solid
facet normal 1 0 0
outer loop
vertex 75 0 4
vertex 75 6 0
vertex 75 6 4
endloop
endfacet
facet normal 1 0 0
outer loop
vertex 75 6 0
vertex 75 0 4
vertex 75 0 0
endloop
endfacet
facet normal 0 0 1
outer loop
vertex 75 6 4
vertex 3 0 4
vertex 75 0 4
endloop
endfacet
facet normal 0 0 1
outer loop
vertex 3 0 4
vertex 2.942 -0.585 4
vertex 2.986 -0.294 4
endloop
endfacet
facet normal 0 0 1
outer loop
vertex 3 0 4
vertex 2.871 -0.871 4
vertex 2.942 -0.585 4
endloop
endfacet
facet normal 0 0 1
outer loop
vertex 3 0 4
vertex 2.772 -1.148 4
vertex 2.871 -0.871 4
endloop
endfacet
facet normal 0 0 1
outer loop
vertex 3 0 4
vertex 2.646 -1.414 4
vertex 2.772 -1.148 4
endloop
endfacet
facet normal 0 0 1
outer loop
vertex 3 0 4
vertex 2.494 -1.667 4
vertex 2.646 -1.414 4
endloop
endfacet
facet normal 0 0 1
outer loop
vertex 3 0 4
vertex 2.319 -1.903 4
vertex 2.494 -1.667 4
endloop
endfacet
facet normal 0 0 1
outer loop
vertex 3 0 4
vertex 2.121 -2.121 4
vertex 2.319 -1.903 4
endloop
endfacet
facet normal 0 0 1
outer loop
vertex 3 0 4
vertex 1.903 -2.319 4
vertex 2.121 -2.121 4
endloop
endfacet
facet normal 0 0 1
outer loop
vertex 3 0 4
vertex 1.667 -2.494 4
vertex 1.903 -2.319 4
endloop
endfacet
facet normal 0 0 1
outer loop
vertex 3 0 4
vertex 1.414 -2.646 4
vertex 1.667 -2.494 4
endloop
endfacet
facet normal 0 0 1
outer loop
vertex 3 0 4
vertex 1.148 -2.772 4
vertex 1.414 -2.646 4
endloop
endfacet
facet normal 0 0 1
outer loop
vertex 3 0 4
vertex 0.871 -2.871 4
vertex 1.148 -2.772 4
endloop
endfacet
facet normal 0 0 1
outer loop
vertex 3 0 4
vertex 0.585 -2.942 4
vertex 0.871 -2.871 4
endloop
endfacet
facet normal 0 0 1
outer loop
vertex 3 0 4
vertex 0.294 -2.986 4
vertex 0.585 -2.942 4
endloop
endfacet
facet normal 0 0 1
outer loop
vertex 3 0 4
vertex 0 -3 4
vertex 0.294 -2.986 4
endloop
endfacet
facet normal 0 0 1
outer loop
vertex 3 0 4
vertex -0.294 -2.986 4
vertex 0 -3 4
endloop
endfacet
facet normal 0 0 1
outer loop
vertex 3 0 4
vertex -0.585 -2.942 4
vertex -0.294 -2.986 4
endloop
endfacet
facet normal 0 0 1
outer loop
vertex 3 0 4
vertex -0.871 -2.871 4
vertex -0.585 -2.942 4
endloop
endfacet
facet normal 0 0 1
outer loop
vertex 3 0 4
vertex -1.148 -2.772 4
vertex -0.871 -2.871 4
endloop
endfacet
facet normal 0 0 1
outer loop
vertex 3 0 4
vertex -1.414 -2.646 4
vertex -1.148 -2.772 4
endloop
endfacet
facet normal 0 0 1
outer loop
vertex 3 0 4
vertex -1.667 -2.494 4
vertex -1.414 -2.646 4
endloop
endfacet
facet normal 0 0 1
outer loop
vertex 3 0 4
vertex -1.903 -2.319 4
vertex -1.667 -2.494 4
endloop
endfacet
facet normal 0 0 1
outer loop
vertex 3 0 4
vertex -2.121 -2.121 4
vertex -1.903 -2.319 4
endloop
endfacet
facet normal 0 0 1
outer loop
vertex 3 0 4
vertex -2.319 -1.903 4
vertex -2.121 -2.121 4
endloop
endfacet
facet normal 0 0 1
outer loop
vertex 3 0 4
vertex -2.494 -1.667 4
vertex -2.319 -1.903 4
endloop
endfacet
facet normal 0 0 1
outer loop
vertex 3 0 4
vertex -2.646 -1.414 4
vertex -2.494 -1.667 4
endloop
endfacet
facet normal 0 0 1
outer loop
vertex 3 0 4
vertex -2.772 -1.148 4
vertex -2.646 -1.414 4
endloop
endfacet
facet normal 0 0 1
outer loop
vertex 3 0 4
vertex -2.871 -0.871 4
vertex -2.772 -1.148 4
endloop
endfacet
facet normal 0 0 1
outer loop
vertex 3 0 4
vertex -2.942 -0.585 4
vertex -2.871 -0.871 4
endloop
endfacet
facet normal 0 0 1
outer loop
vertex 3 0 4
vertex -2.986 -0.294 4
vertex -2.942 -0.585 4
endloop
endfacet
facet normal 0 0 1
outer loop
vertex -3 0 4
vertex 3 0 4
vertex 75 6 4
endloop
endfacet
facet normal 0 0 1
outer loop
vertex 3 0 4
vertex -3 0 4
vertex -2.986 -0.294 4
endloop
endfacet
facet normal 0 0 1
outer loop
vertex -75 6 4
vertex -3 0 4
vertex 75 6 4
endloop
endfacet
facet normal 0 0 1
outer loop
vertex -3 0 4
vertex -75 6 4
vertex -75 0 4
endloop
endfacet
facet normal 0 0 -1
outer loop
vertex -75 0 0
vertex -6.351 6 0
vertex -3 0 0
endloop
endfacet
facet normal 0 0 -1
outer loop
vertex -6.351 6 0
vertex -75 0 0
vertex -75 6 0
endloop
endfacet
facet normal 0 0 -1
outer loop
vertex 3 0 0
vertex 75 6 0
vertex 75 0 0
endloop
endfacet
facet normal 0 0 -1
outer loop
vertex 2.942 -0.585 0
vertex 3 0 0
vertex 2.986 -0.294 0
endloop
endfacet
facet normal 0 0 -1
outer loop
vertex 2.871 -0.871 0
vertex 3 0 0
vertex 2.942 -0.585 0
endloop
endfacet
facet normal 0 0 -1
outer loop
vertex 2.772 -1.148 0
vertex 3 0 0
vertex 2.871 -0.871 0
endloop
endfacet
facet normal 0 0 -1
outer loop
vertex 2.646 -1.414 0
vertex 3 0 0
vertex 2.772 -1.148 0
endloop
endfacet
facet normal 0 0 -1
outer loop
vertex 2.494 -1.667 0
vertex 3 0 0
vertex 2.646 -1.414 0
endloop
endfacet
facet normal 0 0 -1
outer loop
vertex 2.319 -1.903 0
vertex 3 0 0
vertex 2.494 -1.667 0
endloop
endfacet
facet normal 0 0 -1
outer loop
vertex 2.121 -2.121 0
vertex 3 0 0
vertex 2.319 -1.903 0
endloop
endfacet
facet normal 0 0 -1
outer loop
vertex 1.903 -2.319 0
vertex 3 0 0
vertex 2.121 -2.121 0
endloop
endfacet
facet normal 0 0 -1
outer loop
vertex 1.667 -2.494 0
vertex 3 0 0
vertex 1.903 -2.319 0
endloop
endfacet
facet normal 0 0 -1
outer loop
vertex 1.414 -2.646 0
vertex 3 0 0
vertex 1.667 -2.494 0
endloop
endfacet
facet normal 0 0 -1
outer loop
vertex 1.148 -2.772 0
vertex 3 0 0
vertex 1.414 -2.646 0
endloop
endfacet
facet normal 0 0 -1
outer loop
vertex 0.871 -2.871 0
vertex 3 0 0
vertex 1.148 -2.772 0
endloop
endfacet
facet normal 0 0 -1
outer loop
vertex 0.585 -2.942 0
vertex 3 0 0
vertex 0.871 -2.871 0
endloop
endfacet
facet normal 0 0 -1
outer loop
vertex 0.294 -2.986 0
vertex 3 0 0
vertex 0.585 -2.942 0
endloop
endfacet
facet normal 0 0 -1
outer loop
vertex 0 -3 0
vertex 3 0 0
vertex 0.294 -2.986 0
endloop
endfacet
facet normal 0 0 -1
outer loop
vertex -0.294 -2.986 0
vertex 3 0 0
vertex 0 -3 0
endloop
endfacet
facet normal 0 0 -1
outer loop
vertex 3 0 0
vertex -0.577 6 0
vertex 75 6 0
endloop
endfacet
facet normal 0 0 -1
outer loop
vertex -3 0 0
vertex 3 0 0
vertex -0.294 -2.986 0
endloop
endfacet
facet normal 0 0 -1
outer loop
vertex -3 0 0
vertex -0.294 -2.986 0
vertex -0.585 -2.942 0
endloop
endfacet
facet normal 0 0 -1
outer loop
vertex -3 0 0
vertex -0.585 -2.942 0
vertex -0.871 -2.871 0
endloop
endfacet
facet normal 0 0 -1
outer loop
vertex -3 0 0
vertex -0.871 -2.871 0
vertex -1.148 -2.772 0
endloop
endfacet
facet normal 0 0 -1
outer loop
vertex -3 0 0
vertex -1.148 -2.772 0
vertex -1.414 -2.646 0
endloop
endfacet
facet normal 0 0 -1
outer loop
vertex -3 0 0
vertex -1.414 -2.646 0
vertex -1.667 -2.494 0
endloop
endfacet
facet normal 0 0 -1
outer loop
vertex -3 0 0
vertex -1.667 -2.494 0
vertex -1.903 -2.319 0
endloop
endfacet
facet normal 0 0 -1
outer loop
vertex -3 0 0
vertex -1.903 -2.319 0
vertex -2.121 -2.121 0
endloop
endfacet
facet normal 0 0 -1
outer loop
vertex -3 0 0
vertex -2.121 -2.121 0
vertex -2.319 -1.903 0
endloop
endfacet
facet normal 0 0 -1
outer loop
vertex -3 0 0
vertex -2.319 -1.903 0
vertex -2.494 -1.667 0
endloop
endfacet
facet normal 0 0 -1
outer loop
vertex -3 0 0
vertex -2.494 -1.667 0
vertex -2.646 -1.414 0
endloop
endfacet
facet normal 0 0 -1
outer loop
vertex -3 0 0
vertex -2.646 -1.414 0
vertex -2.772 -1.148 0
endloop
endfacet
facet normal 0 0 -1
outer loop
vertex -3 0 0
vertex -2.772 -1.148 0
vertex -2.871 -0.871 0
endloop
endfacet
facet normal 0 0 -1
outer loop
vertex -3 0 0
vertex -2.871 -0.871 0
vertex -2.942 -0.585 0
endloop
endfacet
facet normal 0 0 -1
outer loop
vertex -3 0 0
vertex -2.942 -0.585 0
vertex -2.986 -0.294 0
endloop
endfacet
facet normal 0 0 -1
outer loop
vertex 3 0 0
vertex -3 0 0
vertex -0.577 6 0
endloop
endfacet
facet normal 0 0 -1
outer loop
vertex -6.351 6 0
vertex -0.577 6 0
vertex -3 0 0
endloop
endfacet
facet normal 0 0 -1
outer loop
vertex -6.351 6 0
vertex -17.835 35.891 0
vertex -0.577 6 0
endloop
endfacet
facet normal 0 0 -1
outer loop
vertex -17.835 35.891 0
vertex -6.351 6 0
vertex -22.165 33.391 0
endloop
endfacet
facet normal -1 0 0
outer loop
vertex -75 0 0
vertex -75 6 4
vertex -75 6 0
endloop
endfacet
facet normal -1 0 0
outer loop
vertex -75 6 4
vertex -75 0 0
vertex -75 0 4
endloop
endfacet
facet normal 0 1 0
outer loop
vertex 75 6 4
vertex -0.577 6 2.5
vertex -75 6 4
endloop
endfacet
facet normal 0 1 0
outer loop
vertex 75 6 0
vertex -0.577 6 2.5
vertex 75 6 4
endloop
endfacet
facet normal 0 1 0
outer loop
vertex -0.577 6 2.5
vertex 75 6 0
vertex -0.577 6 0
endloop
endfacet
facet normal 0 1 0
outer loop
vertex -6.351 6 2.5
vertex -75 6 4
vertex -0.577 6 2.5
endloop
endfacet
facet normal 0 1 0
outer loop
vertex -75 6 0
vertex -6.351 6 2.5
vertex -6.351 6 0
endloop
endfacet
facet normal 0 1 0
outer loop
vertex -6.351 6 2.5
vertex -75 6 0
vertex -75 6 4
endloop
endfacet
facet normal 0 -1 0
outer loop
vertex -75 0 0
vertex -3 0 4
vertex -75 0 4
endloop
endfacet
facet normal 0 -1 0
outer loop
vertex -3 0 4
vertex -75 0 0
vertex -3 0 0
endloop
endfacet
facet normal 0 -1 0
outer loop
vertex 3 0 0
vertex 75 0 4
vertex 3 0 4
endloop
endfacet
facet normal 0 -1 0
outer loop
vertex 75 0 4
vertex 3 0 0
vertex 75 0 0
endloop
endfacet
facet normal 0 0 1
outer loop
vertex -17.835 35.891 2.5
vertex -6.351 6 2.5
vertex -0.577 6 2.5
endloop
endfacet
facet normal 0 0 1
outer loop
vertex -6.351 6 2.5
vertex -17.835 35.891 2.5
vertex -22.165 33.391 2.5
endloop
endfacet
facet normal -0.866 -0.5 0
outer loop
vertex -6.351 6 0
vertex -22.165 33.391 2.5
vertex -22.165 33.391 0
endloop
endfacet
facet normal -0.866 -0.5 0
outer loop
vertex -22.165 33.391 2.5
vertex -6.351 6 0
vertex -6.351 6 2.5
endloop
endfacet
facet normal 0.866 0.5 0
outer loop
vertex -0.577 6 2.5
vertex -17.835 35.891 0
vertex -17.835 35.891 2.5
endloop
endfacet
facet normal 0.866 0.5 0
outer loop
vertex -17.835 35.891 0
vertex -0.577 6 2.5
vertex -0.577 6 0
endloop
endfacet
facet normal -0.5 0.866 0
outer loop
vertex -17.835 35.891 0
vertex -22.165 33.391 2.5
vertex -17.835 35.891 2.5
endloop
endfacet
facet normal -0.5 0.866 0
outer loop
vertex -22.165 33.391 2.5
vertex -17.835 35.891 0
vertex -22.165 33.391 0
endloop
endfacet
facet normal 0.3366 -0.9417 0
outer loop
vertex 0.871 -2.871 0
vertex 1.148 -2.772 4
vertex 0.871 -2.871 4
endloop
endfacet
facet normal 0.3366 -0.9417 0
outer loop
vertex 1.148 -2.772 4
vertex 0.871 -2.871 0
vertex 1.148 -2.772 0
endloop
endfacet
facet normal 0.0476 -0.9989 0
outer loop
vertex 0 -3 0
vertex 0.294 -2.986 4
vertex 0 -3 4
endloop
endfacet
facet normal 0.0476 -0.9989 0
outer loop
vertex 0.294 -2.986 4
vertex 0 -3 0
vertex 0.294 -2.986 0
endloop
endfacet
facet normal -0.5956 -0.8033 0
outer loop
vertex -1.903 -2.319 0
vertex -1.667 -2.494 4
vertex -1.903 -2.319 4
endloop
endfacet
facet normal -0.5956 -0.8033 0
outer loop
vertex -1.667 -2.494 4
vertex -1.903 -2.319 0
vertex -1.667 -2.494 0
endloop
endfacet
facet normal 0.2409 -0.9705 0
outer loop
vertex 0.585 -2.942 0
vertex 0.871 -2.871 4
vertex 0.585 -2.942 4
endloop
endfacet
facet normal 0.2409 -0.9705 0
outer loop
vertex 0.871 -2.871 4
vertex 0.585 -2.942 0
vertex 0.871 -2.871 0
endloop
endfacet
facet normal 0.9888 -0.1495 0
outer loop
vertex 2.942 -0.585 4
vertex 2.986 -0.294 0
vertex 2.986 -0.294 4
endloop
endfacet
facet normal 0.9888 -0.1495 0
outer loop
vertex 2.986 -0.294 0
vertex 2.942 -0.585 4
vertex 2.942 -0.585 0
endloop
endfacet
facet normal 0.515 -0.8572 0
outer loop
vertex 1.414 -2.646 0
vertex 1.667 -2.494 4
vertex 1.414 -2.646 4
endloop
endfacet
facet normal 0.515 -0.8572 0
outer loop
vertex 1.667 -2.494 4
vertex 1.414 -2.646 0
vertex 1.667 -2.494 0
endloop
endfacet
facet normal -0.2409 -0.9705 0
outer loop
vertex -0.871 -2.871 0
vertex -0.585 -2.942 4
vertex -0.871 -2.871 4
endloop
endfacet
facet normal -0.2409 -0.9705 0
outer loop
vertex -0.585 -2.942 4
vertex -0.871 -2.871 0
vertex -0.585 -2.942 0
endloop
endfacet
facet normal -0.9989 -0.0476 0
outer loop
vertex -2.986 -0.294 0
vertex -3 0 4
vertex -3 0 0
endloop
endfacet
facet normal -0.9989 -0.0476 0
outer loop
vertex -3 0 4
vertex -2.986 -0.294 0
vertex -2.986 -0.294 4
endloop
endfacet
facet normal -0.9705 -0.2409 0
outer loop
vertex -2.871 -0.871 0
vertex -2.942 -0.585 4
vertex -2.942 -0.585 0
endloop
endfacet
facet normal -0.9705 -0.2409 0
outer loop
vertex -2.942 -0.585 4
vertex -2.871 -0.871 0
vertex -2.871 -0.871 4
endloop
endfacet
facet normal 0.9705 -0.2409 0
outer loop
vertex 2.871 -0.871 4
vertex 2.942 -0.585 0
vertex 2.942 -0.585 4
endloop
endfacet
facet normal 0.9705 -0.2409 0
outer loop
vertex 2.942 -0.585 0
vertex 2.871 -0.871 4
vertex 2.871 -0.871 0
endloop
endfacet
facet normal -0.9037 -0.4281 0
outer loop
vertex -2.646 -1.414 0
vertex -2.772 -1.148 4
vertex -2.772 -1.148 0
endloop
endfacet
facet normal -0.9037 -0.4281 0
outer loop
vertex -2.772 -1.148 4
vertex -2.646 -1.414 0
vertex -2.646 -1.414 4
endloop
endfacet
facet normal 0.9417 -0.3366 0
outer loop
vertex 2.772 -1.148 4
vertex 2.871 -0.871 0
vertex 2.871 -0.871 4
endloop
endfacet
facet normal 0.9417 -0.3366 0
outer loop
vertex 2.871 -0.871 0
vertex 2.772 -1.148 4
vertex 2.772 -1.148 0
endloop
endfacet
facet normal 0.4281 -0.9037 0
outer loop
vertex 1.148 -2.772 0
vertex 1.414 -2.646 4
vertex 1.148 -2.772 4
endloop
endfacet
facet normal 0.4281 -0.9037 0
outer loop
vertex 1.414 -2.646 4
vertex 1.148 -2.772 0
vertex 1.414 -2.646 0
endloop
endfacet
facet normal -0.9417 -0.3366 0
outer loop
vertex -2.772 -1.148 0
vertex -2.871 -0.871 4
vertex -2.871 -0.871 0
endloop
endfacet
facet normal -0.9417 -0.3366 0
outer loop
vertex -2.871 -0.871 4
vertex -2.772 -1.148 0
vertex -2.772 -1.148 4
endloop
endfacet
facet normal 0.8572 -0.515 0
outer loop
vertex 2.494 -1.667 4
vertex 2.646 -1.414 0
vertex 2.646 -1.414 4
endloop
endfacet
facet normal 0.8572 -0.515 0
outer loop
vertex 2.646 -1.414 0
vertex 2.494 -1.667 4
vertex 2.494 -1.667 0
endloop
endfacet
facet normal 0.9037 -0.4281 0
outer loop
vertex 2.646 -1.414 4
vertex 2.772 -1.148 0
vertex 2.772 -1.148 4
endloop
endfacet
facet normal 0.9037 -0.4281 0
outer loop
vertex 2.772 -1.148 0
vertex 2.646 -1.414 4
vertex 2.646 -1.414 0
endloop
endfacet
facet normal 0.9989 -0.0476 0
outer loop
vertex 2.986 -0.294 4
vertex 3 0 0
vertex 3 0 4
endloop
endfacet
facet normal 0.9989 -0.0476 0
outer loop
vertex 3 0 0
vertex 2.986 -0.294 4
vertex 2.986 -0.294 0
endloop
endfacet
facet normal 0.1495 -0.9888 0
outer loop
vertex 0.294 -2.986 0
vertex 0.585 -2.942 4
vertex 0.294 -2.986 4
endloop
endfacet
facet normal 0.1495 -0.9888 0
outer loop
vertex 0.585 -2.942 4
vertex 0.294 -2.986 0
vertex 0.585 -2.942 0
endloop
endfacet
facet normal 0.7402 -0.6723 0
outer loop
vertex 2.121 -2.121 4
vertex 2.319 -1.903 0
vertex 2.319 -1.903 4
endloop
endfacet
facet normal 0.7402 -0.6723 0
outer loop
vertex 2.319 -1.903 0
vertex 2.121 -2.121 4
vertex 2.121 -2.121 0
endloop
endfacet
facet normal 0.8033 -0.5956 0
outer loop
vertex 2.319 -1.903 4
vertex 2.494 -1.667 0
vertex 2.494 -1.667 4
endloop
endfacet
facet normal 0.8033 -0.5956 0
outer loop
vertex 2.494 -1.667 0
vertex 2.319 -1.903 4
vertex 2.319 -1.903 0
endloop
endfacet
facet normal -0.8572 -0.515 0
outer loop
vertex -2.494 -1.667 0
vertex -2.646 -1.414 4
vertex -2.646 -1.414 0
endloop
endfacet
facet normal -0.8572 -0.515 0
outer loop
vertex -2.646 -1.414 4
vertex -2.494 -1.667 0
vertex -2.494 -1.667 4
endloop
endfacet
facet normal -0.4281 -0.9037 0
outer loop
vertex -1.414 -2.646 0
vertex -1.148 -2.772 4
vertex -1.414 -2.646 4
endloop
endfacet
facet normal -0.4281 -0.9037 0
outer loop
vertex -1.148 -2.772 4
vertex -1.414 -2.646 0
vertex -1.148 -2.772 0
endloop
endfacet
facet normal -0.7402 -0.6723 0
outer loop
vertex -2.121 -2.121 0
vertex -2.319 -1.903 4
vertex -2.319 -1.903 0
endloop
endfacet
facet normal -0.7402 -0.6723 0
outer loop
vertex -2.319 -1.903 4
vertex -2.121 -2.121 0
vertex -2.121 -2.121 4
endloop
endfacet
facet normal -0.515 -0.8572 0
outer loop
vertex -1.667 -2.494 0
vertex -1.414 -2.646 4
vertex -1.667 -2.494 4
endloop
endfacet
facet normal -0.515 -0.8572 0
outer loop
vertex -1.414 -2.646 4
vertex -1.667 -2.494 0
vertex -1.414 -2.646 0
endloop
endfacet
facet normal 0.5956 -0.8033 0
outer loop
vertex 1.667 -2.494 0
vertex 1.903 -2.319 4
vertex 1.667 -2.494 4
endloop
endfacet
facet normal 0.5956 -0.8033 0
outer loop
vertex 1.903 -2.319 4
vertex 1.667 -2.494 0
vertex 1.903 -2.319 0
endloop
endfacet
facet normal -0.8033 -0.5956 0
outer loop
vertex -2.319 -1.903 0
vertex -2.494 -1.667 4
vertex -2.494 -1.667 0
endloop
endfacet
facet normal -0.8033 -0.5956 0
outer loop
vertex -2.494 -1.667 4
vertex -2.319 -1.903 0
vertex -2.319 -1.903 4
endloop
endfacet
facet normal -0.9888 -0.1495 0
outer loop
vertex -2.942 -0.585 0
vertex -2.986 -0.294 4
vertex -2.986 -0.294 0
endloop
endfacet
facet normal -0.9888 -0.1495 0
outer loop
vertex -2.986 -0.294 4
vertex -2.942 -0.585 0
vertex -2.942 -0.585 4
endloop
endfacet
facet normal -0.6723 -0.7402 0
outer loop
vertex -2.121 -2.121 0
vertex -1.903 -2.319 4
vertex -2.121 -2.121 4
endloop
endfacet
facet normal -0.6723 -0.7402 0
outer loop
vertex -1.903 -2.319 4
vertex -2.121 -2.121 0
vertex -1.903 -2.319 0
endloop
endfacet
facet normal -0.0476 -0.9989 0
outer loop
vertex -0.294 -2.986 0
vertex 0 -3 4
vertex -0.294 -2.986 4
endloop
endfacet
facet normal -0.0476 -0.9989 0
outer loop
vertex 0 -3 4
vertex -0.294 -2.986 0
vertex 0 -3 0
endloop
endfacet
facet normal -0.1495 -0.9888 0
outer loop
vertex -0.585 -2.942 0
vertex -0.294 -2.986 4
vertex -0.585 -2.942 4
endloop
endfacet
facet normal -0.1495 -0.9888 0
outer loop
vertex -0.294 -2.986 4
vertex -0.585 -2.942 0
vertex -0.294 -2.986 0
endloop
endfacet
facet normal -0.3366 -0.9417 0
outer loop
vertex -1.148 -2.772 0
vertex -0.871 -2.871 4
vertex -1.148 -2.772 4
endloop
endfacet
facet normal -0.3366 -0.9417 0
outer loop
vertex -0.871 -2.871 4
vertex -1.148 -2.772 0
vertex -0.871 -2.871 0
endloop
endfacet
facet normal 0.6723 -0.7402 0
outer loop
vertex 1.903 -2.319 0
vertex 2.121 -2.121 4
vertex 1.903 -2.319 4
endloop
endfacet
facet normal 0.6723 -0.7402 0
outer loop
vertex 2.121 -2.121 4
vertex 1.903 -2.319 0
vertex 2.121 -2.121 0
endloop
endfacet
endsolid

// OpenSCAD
// L-shaped (hockey-stick) cell spreader for plating bacteria
// Dimensions measured with calipers

// Handle dimensions
handle_length = 150;
handle_width = 6;
handle_thickness = 4;

// Spreading foot dimensions
foot_length = 40;
foot_width = 5;
foot_thickness = 2.5;

// Boss dimensions
boss_diameter = 6;
boss_height = 4;

// Hanging hole dimensions
hole_diameter = 4;
hole_x = 143;
hole_y = 0;

// Angle of the foot relative to +X axis (120 degrees counter-clockwise)
foot_angle = 120;

// Quality of curved shapes
$fn = 64;

// Main union of all parts
union() {
    // Handle: centered in Y, extending from x=0 to x=150
    // To center on origin in X and Y as per rules, we translate the handle
    // The handle goes from x=0 to x=150, so its center in X is at 75
    // We translate it so that the joint is at the origin
    translate([-handle_length/2, 0, 0])
        cube([handle_length, handle_width, handle_thickness], center = false);

    // Spreading foot: rotated 120 degrees from +X axis
    // The foot starts at the origin and extends outward
    // We model it as a cube and then rotate it
    rotate([0, 0, foot_angle])
        translate([0, -foot_width/2, 0])
            cube([foot_length, foot_width, foot_thickness], center = false);

    // Boss at the origin: cylinder centered at origin
    // The boss joins the handle and foot at the origin
    translate([0, 0, 0])
        cylinder(h = boss_height, r = boss_diameter/2, center = false);

    // Hanging hole through the handle
    // The hole is at x=143, y=0, going through the handle thickness
    // We subtract a cylinder that extends slightly past the handle
    difference() {
        // Empty placeholder - the difference will be applied to the whole union
        // Actually, we need to restructure to apply the hole subtraction
    }
}

// Corrected approach: use difference on the entire union
difference() {
    union() {
        // Handle
        translate([-handle_length/2, 0, 0])
            cube([handle_length, handle_width, handle_thickness], center = false);

        // Spreading foot
        rotate([0, 0, foot_angle])
            translate([0, -foot_width/2, 0])
                cube([foot_length, foot_width, foot_thickness], center = false);

        // Boss
        translate([0, 0, 0])
            cylinder(h = boss_height, r = boss_diameter/2, center = false);
    }

    // Hanging hole: cylinder extending through the handle
    // Position the hole at x=143, y=0
    // The hole goes through the z-direction (through the thickness)
    // Extend slightly past the handle thickness (4mm) to ensure clean cut
    translate([hole_x - handle_length/2, hole_y, -0.5])
        cylinder(h = handle_thickness + 1, r = hole_diameter/2, center = false);
}
